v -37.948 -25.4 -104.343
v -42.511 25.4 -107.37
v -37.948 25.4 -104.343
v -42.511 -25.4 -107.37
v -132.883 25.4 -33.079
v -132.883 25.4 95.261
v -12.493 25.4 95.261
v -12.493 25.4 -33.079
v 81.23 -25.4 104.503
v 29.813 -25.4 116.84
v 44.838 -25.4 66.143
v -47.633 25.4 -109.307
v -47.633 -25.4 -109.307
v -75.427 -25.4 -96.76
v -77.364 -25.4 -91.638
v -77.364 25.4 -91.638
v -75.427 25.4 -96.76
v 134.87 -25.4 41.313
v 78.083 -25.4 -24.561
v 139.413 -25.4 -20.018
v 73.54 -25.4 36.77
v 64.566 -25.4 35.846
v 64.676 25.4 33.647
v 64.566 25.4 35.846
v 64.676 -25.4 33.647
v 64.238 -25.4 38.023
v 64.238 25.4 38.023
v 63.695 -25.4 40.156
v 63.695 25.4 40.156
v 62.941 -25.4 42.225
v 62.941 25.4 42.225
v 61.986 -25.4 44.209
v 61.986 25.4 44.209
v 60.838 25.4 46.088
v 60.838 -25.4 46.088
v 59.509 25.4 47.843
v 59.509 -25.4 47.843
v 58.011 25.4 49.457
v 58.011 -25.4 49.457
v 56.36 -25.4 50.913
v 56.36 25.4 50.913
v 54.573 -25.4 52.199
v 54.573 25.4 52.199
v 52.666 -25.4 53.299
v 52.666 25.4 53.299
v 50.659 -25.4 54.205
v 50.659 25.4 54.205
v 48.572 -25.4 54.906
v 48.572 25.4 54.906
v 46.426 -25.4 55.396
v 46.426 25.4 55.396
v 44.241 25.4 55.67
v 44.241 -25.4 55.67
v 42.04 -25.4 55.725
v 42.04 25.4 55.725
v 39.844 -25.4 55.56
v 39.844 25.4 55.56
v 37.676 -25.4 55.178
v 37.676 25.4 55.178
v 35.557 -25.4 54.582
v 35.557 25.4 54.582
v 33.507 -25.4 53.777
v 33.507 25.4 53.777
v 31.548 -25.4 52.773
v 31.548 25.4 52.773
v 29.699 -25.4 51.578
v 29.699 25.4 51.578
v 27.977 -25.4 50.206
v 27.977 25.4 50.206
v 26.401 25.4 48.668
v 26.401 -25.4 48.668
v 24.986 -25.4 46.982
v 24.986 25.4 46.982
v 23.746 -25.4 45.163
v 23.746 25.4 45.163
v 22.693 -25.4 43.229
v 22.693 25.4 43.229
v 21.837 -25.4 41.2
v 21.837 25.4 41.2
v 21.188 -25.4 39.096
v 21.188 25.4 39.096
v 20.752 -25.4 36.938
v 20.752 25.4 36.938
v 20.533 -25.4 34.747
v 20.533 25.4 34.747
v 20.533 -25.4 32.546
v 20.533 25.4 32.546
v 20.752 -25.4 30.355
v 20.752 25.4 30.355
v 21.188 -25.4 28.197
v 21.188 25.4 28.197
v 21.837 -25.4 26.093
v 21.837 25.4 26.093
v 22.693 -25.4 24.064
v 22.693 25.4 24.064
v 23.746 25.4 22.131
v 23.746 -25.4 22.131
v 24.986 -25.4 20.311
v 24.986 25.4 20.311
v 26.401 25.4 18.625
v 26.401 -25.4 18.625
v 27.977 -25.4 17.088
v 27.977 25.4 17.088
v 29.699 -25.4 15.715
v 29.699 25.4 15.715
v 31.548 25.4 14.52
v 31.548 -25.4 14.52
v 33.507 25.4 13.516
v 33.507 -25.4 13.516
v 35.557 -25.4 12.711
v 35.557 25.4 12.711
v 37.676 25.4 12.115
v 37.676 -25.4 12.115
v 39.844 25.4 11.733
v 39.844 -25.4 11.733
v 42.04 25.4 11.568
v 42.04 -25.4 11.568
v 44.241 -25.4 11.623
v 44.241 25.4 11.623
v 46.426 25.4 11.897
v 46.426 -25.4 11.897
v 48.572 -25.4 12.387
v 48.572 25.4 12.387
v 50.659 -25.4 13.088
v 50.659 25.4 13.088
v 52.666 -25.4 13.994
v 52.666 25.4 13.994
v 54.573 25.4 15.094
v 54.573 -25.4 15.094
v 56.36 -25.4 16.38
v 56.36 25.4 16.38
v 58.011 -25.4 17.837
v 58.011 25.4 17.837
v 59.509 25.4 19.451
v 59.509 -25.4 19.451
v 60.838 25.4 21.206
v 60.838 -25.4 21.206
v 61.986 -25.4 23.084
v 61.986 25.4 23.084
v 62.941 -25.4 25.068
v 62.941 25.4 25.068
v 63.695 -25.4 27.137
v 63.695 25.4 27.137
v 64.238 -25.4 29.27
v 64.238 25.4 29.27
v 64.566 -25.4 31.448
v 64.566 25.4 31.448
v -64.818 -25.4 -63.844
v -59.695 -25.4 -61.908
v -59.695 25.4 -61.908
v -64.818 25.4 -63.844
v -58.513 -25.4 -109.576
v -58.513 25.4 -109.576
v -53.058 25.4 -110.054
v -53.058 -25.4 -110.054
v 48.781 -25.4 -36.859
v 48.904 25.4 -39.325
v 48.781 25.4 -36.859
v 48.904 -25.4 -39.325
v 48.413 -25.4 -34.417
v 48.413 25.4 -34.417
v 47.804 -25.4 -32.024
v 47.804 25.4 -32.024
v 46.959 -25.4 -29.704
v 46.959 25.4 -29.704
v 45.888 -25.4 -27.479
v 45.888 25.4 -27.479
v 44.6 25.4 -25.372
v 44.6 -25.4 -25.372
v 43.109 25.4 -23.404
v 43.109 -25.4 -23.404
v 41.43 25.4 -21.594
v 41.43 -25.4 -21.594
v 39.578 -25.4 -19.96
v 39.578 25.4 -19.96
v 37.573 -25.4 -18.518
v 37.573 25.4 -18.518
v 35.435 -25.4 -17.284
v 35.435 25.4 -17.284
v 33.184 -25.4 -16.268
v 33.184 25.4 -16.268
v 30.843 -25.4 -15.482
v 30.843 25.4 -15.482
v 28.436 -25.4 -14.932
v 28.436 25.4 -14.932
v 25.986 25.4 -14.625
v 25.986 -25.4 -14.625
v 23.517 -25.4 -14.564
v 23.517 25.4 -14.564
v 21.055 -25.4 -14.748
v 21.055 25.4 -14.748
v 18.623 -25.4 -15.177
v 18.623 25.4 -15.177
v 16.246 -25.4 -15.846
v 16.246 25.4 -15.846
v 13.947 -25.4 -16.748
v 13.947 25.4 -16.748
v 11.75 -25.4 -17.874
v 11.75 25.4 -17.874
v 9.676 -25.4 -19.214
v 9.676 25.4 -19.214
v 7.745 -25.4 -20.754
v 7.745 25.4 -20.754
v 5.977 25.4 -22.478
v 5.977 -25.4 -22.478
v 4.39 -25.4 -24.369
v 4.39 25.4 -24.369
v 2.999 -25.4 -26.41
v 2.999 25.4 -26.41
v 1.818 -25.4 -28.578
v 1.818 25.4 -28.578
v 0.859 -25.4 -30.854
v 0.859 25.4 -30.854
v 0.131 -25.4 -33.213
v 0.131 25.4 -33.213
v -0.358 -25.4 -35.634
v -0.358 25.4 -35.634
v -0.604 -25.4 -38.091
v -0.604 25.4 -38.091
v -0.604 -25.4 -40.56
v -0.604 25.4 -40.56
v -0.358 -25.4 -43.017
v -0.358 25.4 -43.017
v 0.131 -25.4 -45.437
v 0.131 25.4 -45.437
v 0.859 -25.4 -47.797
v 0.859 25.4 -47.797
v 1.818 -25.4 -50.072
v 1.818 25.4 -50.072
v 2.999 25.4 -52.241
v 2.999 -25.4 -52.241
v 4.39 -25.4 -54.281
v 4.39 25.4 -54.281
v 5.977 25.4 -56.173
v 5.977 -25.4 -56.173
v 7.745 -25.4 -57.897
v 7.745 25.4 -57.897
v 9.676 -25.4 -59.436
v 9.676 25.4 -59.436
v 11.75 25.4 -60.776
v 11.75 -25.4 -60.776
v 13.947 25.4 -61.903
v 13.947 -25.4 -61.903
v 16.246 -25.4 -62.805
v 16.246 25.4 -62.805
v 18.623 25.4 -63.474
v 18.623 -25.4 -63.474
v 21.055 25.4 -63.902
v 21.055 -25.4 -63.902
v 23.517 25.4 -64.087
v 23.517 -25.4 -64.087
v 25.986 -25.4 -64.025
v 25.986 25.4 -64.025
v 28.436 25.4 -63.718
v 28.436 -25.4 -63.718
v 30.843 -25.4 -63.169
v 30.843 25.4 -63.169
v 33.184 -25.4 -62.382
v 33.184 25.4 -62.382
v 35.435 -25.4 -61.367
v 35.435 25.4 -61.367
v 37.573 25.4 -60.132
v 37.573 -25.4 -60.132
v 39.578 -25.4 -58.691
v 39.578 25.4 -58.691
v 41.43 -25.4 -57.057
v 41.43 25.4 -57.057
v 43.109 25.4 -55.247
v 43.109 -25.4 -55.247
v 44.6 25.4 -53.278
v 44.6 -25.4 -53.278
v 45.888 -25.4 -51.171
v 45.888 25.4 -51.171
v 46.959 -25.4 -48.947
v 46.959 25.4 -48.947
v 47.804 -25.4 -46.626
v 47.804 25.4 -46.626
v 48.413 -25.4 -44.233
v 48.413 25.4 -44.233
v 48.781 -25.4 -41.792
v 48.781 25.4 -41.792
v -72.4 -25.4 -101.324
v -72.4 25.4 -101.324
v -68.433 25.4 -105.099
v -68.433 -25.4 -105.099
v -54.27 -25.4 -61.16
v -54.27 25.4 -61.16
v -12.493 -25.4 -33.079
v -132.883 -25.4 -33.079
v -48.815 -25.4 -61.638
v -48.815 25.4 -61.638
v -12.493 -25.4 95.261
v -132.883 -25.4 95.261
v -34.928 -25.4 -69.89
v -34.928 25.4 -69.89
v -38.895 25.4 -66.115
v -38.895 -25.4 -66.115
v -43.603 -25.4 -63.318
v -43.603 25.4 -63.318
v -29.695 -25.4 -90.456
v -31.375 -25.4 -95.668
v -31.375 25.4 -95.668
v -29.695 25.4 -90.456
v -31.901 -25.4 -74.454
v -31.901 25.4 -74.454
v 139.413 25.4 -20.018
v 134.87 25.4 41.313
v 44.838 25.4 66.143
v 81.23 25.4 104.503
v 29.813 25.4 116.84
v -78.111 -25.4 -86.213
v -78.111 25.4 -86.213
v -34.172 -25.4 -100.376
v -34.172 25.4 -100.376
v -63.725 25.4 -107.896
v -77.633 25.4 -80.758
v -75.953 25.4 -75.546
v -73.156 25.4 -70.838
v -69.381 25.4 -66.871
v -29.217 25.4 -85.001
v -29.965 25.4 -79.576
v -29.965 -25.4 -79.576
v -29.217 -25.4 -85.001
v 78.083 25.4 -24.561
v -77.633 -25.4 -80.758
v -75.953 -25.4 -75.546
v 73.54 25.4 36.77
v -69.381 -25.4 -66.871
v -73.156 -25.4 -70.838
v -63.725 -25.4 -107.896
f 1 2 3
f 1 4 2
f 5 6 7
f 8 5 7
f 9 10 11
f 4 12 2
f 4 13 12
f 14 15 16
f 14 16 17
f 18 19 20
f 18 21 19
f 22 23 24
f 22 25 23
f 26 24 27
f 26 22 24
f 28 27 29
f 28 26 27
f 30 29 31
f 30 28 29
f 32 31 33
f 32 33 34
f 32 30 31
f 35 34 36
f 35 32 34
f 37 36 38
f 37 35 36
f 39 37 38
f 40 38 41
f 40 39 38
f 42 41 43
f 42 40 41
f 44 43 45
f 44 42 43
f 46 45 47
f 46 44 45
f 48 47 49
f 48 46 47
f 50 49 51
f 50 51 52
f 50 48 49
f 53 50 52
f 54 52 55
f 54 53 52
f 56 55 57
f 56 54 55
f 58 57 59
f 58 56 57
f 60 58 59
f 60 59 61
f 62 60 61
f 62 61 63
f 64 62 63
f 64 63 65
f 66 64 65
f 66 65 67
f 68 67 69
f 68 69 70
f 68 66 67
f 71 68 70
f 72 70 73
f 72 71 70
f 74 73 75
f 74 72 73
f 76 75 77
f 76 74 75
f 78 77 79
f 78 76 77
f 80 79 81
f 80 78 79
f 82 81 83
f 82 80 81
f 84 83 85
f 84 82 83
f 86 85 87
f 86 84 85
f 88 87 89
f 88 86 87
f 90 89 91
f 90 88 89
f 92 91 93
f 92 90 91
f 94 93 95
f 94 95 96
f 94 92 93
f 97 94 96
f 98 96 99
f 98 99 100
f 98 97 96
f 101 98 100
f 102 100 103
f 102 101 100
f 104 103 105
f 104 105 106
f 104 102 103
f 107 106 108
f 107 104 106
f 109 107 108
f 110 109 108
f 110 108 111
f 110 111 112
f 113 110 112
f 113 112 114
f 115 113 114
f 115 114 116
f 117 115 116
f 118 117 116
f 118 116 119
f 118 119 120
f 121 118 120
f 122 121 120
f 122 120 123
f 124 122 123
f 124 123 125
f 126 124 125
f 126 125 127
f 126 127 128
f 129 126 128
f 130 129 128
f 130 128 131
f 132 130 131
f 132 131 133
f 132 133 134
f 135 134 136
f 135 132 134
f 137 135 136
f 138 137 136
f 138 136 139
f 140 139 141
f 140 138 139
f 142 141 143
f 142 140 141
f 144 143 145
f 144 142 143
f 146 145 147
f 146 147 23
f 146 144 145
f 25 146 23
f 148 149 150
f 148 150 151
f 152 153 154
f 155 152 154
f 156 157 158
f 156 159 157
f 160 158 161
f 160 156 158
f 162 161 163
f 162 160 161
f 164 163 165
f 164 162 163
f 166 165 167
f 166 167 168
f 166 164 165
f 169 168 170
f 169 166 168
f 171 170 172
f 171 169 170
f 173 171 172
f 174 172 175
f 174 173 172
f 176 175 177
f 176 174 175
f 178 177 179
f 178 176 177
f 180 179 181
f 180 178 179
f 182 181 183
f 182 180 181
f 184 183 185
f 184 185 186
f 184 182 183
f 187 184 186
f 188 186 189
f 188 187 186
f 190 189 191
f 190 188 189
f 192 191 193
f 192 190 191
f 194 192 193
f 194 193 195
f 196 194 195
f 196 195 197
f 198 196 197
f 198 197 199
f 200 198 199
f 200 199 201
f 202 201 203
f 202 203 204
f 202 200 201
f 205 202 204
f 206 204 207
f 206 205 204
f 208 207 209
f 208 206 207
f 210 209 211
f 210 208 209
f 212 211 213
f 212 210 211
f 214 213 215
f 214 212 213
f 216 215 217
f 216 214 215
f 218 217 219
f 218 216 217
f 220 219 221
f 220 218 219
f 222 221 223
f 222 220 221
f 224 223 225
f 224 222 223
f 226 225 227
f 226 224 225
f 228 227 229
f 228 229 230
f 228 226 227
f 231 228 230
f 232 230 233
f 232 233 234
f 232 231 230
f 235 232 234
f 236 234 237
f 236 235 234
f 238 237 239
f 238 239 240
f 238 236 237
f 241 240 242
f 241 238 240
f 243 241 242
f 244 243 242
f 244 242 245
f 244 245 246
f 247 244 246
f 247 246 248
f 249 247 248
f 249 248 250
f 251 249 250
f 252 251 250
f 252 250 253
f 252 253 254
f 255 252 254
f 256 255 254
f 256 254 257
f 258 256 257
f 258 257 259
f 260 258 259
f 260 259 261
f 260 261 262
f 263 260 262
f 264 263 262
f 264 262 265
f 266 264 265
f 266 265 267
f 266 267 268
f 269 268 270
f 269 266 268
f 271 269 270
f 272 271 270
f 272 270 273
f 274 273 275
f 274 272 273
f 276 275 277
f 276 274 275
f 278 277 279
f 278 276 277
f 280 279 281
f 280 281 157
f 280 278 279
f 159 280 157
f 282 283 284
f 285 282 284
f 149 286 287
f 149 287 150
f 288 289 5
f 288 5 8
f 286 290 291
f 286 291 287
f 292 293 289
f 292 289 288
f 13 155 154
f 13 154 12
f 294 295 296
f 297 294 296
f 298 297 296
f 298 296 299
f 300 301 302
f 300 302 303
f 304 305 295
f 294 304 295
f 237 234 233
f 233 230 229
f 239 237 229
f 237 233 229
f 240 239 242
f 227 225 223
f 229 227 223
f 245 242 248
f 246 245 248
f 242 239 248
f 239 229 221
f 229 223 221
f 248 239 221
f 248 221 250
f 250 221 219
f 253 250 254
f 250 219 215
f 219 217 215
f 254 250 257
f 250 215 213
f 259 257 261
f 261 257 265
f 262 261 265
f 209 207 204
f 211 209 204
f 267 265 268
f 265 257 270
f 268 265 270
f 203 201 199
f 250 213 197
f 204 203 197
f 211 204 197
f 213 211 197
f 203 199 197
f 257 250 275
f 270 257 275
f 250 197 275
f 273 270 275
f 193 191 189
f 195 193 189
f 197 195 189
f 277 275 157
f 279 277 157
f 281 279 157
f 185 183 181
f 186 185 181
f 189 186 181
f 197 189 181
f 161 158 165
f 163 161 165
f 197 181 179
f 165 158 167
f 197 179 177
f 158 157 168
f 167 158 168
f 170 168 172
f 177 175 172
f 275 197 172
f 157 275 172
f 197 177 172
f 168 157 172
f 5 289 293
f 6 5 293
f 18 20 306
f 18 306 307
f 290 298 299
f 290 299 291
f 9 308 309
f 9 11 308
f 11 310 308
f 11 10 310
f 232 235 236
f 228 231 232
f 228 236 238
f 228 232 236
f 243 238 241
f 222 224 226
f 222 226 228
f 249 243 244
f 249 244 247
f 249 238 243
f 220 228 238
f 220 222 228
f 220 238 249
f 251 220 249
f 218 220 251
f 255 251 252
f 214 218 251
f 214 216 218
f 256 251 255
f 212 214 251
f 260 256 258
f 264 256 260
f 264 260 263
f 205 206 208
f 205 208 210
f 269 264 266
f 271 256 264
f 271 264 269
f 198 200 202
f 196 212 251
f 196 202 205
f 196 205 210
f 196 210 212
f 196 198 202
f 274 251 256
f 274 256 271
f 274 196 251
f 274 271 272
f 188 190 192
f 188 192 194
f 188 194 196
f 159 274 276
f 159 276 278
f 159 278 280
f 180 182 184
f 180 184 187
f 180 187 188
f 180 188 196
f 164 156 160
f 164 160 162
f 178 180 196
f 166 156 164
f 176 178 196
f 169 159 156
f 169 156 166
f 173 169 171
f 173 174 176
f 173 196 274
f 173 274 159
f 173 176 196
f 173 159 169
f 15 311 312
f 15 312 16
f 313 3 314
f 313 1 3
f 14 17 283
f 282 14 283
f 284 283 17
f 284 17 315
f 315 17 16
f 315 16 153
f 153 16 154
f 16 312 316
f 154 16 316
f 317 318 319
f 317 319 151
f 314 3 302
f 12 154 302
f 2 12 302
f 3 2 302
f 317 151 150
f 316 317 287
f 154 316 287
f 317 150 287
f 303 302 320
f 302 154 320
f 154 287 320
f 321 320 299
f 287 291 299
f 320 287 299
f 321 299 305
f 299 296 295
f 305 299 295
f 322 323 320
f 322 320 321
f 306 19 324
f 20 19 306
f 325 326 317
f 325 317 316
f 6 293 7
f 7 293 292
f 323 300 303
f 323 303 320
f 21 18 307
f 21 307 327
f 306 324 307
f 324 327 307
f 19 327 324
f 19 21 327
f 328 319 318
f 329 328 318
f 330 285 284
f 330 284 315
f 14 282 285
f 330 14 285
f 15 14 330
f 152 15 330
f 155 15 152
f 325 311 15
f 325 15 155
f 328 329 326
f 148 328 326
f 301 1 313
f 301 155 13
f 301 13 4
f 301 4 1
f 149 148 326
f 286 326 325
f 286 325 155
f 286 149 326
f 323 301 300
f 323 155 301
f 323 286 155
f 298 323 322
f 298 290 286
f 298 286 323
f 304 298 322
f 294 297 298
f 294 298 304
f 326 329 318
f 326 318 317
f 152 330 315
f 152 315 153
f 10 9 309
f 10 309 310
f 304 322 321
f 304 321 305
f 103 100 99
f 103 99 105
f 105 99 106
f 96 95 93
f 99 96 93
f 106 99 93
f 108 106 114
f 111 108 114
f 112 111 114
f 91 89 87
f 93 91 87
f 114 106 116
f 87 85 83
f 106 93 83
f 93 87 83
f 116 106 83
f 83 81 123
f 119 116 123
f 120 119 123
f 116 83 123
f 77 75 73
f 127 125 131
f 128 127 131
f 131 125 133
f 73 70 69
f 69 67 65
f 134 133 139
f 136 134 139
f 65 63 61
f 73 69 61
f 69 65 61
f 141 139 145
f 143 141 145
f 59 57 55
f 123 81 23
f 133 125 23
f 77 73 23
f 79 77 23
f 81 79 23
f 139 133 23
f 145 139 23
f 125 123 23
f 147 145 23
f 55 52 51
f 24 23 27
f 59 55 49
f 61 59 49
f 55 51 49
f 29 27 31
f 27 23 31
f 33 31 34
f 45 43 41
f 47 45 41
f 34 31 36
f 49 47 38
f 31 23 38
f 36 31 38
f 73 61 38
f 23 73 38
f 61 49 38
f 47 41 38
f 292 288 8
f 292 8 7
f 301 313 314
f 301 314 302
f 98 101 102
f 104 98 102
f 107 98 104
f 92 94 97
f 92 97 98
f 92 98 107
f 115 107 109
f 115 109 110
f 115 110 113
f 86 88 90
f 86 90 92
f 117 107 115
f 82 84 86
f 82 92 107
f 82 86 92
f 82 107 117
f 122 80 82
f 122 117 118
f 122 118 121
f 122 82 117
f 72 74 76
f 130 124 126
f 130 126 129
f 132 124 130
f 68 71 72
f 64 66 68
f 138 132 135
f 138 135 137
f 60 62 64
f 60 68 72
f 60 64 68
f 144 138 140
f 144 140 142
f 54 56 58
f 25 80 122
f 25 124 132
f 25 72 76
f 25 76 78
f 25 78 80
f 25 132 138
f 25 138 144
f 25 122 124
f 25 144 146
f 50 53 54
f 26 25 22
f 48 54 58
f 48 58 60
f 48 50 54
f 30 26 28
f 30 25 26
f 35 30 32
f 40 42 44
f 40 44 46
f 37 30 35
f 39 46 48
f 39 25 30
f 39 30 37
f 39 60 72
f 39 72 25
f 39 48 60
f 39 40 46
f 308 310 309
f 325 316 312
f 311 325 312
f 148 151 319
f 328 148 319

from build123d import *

# Parameters (mm, degrees)
F0_W     = 120.389337
F0_H     = 128.339571
F0_R     = 22.085124
F0_R_2   = 24.769336
F1_DEPTH = 25.4
F2_DEPTH = 25.4


with BuildPart() as f1:
    # F0 (on Front) → F1 (new body)
    with BuildSketch(Plane.XZ):
        with Locations((-72.687901, 31.091114)):
            Rectangle(F0_W, F0_H)
        with Locations((42.590559, 33.64655)):
            Circle(F0_R)
        with Locations((24.134653, -39.325286)):
            Circle(F0_R_2)
        Polygon((-37.947542, -104.342823), (-34.172483, -100.375812), (-31.374816, -95.668232), (-29.694827, -90.456142), (-29.216758, -85.000898), (-29.964581, -79.576047), (-31.900797, -74.453615), (-34.928317, -69.890461), (-38.895328, -66.115402), (-43.602908, -63.317735), (-48.814998, -61.637746), (-54.270242, -61.159677), (-59.695093, -61.9075), (-64.817525, -63.843716), (-69.380679, -66.871236), (-73.155738, -70.838247), (-75.953405, -75.545827), (-77.633394, -80.757917), (-78.111464, -86.213161), (-77.36364, -91.638012), (-75.427424, -96.760444), (-72.399904, -101.323598), (-68.432893, -105.098657), (-63.725314, -107.896324), (-58.513224, -109.576313), (-53.057979, -110.054382), (-47.633128, -109.306559), (-42.510696, -107.370343), align=None)
        Polygon((78.0827, -24.560563), (139.413114, -20.017557), (134.870107, 41.312857), (73.539694, 36.76985), align=None)
        Polygon((44.837683, 66.143148), (81.230387, 104.503058), (29.813379, 116.840109), align=None)
    extrude(amount=F1_DEPTH)

    # F0 (on Front) → F2 (join)
    with BuildSketch(Plane.XZ):
        with Locations((-72.687901, 31.091114)):
            Rectangle(F0_W, F0_H)
        with Locations((42.590559, 33.64655)):
            Circle(F0_R)
        with Locations((24.134653, -39.325286)):
            Circle(F0_R_2)
        Polygon((-37.947542, -104.342823), (-34.172483, -100.375812), (-31.374816, -95.668232), (-29.694827, -90.456142), (-29.216758, -85.000898), (-29.964581, -79.576047), (-31.900797, -74.453615), (-34.928317, -69.890461), (-38.895328, -66.115402), (-43.602908, -63.317735), (-48.814998, -61.637746), (-54.270242, -61.159677), (-59.695093, -61.9075), (-64.817525, -63.843716), (-69.380679, -66.871236), (-73.155738, -70.838247), (-75.953405, -75.545827), (-77.633394, -80.757917), (-78.111464, -86.213161), (-77.36364, -91.638012), (-75.427424, -96.760444), (-72.399904, -101.323598), (-68.432893, -105.098657), (-63.725314, -107.896324), (-58.513224, -109.576313), (-53.057979, -110.054382), (-47.633128, -109.306559), (-42.510696, -107.370343), align=None)
        Polygon((78.0827, -24.560563), (139.413114, -20.017557), (134.870107, 41.312857), (73.539694, 36.76985), align=None)
        Polygon((44.837683, 66.143148), (81.230387, 104.503058), (29.813379, 116.840109), align=None)
    extrude(amount=-F2_DEPTH)


solid = f1.part
